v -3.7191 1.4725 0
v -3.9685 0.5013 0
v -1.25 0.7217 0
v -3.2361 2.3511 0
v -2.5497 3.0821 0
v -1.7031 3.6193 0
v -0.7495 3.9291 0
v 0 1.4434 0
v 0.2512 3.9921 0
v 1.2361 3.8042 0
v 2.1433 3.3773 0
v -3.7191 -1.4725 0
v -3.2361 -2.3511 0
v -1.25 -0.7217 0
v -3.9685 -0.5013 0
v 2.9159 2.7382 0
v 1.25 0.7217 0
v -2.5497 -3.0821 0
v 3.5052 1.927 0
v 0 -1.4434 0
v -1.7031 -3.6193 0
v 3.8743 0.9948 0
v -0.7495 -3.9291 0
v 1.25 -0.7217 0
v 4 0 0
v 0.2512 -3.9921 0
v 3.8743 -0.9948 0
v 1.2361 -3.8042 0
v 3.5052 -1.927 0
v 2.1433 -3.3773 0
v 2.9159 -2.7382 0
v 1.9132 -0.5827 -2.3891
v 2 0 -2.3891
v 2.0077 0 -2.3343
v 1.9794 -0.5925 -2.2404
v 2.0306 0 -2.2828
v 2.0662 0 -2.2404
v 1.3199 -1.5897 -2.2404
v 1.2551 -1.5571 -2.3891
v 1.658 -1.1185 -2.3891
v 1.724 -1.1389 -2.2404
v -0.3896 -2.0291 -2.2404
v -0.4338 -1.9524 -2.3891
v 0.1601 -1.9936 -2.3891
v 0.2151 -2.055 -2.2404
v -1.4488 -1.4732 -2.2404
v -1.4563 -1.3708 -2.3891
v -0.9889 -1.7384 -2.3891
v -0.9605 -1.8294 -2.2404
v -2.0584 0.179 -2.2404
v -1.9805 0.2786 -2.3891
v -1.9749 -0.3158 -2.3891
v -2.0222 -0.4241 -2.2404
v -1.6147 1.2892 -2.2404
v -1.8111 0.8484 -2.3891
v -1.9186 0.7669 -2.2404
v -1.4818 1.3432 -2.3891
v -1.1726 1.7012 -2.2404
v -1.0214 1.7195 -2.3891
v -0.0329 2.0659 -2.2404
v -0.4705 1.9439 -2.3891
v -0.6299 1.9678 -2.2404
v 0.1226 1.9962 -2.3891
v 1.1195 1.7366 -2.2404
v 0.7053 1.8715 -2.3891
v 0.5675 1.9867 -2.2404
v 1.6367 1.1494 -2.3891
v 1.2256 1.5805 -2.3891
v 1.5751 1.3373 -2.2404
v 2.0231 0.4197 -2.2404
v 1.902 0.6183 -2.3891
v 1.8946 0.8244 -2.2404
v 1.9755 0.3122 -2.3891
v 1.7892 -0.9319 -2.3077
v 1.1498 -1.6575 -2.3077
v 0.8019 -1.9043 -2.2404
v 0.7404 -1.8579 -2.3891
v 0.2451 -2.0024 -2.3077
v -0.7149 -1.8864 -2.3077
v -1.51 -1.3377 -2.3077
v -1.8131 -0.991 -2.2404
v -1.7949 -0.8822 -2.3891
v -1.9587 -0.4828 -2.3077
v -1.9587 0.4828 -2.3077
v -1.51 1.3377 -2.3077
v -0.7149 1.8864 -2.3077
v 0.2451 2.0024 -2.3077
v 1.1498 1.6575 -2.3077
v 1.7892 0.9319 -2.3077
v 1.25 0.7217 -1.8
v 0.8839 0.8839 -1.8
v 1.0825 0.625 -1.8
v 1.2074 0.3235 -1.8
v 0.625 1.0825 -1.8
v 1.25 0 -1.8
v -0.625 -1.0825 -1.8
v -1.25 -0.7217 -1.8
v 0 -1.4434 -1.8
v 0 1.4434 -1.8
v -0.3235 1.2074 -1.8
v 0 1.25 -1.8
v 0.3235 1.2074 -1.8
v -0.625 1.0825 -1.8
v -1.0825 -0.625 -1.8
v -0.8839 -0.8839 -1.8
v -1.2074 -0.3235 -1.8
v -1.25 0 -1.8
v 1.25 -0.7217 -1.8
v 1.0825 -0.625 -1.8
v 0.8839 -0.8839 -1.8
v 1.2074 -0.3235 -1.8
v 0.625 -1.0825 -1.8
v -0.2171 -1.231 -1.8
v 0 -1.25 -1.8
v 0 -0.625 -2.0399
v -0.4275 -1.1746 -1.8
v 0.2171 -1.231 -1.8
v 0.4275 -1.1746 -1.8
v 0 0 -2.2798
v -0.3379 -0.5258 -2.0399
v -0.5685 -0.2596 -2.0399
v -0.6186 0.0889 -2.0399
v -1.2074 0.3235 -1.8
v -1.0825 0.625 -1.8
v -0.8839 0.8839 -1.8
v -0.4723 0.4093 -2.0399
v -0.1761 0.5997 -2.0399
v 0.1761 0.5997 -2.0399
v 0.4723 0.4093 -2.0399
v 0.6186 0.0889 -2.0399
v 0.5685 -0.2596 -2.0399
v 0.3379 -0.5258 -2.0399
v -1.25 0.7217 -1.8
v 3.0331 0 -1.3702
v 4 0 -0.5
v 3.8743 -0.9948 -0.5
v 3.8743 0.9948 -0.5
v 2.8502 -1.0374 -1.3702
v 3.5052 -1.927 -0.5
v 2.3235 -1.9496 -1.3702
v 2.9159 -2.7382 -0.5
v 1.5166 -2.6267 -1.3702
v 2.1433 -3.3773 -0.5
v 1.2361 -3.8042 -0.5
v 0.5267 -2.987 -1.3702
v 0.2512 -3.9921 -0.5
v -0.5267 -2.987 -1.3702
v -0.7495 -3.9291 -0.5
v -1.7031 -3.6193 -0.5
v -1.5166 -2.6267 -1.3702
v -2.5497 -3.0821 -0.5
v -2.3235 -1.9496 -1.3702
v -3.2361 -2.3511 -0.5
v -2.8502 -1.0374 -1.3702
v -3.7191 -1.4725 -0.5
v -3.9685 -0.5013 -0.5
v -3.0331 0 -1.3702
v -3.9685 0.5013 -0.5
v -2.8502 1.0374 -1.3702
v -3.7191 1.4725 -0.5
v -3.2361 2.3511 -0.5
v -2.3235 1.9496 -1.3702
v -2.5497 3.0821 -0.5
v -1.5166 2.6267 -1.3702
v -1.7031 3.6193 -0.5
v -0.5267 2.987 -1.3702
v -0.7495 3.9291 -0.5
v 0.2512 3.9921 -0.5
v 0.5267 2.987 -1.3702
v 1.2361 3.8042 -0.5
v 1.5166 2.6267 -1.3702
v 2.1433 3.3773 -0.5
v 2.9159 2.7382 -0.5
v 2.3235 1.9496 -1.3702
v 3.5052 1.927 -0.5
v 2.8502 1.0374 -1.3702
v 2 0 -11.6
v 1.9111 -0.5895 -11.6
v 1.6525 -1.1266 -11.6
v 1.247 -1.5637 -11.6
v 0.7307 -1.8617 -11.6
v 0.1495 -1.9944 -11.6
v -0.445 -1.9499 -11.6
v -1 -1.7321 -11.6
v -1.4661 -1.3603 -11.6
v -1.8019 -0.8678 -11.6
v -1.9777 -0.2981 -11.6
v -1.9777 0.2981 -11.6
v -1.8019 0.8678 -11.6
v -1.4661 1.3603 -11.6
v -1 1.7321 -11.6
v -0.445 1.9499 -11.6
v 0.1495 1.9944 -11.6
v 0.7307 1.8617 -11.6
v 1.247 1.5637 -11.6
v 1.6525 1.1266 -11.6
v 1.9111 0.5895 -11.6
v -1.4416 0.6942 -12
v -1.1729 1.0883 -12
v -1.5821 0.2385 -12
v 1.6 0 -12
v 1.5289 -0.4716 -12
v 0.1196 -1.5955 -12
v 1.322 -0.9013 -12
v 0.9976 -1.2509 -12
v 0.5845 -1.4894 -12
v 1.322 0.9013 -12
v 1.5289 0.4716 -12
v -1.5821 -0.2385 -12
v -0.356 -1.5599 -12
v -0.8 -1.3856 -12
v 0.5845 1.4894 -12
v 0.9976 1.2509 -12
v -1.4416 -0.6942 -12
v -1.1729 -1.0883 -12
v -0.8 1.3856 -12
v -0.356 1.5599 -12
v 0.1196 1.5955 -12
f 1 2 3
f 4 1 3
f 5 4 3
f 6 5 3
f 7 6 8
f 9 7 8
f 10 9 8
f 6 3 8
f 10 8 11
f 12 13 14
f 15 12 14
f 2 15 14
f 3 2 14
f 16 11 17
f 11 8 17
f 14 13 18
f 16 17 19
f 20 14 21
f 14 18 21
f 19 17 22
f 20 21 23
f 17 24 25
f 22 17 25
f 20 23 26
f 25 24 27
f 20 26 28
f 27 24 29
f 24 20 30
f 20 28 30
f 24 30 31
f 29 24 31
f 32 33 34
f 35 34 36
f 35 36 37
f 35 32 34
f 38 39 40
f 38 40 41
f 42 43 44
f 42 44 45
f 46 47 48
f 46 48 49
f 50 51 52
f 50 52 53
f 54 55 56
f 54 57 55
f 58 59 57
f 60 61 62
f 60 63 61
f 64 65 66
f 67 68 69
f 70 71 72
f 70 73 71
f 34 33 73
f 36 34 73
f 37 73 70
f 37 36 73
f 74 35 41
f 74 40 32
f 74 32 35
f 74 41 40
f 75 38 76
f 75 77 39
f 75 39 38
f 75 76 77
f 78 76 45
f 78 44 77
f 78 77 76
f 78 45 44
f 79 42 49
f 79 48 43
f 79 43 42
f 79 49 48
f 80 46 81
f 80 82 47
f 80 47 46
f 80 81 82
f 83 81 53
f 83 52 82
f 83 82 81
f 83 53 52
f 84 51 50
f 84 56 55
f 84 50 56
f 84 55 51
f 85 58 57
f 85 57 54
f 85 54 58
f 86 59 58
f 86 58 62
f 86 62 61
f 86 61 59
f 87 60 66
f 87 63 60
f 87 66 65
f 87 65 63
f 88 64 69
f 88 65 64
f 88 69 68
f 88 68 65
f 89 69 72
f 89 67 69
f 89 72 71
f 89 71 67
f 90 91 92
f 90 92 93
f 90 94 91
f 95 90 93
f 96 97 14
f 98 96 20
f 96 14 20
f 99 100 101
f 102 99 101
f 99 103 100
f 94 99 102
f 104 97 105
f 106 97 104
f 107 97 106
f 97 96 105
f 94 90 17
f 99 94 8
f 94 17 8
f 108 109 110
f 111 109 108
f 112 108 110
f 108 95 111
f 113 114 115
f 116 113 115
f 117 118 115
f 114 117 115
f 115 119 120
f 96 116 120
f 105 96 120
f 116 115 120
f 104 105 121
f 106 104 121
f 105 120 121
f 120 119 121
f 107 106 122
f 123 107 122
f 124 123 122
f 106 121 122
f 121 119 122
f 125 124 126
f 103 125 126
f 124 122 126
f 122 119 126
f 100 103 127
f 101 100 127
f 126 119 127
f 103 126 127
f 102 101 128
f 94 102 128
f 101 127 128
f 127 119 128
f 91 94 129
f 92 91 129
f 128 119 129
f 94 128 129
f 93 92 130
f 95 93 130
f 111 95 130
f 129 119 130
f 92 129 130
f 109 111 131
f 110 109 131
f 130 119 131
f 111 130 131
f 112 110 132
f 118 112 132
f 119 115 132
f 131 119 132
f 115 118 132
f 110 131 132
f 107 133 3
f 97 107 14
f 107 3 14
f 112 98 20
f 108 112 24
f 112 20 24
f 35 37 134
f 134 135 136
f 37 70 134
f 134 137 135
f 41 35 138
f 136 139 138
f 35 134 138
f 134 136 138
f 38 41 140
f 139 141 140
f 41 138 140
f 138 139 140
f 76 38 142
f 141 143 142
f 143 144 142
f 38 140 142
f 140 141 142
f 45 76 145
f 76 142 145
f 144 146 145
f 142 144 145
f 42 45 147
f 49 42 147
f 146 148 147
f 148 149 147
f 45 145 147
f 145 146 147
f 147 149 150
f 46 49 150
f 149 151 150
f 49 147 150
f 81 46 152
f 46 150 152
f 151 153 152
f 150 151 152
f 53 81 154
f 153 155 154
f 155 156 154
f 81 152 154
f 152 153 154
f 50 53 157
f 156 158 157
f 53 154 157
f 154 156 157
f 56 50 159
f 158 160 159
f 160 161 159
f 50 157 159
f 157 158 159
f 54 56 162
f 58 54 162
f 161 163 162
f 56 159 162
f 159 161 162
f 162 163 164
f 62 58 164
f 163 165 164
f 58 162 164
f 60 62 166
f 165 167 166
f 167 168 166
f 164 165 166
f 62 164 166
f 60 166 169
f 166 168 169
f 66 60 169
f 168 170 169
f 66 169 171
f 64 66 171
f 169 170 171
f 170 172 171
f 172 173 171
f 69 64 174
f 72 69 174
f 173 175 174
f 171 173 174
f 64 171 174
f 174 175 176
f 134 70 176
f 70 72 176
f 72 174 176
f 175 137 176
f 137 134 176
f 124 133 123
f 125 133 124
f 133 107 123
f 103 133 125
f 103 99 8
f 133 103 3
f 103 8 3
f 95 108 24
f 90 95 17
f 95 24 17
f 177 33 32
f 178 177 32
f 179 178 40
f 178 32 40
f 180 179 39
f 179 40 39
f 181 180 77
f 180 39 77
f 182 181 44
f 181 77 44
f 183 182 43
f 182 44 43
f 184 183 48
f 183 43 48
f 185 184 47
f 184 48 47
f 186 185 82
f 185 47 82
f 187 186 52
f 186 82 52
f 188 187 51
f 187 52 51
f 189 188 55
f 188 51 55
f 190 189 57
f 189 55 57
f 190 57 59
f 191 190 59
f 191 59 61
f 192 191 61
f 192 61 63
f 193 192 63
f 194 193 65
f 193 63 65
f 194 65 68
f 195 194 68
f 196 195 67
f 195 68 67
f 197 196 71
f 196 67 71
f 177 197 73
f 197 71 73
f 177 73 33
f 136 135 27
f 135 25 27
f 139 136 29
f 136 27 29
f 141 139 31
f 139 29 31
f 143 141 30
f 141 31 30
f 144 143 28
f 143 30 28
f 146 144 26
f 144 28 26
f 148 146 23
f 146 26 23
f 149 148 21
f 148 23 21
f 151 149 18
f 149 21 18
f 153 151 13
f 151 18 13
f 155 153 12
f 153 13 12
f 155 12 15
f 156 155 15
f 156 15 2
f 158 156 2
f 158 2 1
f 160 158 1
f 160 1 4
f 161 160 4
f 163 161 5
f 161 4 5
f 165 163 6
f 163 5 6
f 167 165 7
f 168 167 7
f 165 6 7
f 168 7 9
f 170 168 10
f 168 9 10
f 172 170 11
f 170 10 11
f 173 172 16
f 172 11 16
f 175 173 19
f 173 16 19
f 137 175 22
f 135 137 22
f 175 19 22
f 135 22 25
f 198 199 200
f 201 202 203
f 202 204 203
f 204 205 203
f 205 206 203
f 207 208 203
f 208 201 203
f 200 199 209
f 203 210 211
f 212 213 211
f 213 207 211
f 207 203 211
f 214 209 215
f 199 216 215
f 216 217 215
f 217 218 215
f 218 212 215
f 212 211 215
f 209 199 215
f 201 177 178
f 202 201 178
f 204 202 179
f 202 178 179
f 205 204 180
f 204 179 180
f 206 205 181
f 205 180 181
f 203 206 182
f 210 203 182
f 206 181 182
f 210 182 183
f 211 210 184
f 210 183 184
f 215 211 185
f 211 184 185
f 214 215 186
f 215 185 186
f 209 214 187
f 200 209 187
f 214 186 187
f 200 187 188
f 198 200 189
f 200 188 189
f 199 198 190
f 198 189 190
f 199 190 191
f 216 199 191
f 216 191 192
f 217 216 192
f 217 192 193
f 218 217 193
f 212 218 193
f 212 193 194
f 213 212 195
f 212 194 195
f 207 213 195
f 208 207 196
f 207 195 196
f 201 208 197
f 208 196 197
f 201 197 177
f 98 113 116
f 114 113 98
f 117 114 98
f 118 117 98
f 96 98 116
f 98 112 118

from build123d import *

# Parameters (mm, degrees)
CHANFRO1_SIZE         = 0.4
CORTE_EXTRUS_O1_DEPTH = 1.8
FILETE1_R             = 0.2


with BuildPart() as part:
    # Esboço4 → Revolução1 (revolve)
    with BuildSketch(Plane(origin=(0, 0, 0), x_dir=(0, 0, -1), z_dir=(1, 0, 0)), mode=Mode.PRIVATE) as revolu_o1_sk:
        Polygon((0, 4), (0, 0), (12, 0), (12, 2), (2.3, 2), (0.5, 4), align=None)
    revolve(revolu_o1_sk.sketch.rotate(Axis((0, 0, 0), (0, 0, -1)), 90), axis=Axis((0, 0, 0), (0, 0, -1)))

    # Chanfro1
    chanfro1_edges = [part.edges().sort_by_distance(p)[0] for p in [
        (-2, 0, -12),
    ]]
    chamfer(chanfro1_edges, length=CHANFRO1_SIZE)

    # Esboço5 → Corte-extrusão1 (cut)
    with BuildSketch(Plane.XY):
        Polygon((-1.25, -0.721687836), (0, -1.443375673), (1.25, -0.721687836), (1.25, 0.721687836), (0, 1.443375673), (-1.25, 0.721687836), align=None)
    extrude(amount=-CORTE_EXTRUS_O1_DEPTH, mode=Mode.SUBTRACT)

    # Corte-extrusão2 cone 1 section (through the dimple's axis) → Corte-extrusão2 (revolve, cut)
    with BuildSketch(Plane(origin=(0, 0, -1.8), x_dir=(0, -1, 0), z_dir=(1, 0, 0))):
        Polygon((0, 0), (1.25, 0), (0, 0.479830044), align=None)
    revolve(axis=Axis((0, 0, -1.8), (0, 0, -1)), mode=Mode.SUBTRACT)

    # Filete1
    filete1_edges = [part.edges().sort_by_distance(p)[0] for p in [
        (-2, 0, -2.3),
    ]]
    fillet(filete1_edges, radius=FILETE1_R)


solid = part.part
